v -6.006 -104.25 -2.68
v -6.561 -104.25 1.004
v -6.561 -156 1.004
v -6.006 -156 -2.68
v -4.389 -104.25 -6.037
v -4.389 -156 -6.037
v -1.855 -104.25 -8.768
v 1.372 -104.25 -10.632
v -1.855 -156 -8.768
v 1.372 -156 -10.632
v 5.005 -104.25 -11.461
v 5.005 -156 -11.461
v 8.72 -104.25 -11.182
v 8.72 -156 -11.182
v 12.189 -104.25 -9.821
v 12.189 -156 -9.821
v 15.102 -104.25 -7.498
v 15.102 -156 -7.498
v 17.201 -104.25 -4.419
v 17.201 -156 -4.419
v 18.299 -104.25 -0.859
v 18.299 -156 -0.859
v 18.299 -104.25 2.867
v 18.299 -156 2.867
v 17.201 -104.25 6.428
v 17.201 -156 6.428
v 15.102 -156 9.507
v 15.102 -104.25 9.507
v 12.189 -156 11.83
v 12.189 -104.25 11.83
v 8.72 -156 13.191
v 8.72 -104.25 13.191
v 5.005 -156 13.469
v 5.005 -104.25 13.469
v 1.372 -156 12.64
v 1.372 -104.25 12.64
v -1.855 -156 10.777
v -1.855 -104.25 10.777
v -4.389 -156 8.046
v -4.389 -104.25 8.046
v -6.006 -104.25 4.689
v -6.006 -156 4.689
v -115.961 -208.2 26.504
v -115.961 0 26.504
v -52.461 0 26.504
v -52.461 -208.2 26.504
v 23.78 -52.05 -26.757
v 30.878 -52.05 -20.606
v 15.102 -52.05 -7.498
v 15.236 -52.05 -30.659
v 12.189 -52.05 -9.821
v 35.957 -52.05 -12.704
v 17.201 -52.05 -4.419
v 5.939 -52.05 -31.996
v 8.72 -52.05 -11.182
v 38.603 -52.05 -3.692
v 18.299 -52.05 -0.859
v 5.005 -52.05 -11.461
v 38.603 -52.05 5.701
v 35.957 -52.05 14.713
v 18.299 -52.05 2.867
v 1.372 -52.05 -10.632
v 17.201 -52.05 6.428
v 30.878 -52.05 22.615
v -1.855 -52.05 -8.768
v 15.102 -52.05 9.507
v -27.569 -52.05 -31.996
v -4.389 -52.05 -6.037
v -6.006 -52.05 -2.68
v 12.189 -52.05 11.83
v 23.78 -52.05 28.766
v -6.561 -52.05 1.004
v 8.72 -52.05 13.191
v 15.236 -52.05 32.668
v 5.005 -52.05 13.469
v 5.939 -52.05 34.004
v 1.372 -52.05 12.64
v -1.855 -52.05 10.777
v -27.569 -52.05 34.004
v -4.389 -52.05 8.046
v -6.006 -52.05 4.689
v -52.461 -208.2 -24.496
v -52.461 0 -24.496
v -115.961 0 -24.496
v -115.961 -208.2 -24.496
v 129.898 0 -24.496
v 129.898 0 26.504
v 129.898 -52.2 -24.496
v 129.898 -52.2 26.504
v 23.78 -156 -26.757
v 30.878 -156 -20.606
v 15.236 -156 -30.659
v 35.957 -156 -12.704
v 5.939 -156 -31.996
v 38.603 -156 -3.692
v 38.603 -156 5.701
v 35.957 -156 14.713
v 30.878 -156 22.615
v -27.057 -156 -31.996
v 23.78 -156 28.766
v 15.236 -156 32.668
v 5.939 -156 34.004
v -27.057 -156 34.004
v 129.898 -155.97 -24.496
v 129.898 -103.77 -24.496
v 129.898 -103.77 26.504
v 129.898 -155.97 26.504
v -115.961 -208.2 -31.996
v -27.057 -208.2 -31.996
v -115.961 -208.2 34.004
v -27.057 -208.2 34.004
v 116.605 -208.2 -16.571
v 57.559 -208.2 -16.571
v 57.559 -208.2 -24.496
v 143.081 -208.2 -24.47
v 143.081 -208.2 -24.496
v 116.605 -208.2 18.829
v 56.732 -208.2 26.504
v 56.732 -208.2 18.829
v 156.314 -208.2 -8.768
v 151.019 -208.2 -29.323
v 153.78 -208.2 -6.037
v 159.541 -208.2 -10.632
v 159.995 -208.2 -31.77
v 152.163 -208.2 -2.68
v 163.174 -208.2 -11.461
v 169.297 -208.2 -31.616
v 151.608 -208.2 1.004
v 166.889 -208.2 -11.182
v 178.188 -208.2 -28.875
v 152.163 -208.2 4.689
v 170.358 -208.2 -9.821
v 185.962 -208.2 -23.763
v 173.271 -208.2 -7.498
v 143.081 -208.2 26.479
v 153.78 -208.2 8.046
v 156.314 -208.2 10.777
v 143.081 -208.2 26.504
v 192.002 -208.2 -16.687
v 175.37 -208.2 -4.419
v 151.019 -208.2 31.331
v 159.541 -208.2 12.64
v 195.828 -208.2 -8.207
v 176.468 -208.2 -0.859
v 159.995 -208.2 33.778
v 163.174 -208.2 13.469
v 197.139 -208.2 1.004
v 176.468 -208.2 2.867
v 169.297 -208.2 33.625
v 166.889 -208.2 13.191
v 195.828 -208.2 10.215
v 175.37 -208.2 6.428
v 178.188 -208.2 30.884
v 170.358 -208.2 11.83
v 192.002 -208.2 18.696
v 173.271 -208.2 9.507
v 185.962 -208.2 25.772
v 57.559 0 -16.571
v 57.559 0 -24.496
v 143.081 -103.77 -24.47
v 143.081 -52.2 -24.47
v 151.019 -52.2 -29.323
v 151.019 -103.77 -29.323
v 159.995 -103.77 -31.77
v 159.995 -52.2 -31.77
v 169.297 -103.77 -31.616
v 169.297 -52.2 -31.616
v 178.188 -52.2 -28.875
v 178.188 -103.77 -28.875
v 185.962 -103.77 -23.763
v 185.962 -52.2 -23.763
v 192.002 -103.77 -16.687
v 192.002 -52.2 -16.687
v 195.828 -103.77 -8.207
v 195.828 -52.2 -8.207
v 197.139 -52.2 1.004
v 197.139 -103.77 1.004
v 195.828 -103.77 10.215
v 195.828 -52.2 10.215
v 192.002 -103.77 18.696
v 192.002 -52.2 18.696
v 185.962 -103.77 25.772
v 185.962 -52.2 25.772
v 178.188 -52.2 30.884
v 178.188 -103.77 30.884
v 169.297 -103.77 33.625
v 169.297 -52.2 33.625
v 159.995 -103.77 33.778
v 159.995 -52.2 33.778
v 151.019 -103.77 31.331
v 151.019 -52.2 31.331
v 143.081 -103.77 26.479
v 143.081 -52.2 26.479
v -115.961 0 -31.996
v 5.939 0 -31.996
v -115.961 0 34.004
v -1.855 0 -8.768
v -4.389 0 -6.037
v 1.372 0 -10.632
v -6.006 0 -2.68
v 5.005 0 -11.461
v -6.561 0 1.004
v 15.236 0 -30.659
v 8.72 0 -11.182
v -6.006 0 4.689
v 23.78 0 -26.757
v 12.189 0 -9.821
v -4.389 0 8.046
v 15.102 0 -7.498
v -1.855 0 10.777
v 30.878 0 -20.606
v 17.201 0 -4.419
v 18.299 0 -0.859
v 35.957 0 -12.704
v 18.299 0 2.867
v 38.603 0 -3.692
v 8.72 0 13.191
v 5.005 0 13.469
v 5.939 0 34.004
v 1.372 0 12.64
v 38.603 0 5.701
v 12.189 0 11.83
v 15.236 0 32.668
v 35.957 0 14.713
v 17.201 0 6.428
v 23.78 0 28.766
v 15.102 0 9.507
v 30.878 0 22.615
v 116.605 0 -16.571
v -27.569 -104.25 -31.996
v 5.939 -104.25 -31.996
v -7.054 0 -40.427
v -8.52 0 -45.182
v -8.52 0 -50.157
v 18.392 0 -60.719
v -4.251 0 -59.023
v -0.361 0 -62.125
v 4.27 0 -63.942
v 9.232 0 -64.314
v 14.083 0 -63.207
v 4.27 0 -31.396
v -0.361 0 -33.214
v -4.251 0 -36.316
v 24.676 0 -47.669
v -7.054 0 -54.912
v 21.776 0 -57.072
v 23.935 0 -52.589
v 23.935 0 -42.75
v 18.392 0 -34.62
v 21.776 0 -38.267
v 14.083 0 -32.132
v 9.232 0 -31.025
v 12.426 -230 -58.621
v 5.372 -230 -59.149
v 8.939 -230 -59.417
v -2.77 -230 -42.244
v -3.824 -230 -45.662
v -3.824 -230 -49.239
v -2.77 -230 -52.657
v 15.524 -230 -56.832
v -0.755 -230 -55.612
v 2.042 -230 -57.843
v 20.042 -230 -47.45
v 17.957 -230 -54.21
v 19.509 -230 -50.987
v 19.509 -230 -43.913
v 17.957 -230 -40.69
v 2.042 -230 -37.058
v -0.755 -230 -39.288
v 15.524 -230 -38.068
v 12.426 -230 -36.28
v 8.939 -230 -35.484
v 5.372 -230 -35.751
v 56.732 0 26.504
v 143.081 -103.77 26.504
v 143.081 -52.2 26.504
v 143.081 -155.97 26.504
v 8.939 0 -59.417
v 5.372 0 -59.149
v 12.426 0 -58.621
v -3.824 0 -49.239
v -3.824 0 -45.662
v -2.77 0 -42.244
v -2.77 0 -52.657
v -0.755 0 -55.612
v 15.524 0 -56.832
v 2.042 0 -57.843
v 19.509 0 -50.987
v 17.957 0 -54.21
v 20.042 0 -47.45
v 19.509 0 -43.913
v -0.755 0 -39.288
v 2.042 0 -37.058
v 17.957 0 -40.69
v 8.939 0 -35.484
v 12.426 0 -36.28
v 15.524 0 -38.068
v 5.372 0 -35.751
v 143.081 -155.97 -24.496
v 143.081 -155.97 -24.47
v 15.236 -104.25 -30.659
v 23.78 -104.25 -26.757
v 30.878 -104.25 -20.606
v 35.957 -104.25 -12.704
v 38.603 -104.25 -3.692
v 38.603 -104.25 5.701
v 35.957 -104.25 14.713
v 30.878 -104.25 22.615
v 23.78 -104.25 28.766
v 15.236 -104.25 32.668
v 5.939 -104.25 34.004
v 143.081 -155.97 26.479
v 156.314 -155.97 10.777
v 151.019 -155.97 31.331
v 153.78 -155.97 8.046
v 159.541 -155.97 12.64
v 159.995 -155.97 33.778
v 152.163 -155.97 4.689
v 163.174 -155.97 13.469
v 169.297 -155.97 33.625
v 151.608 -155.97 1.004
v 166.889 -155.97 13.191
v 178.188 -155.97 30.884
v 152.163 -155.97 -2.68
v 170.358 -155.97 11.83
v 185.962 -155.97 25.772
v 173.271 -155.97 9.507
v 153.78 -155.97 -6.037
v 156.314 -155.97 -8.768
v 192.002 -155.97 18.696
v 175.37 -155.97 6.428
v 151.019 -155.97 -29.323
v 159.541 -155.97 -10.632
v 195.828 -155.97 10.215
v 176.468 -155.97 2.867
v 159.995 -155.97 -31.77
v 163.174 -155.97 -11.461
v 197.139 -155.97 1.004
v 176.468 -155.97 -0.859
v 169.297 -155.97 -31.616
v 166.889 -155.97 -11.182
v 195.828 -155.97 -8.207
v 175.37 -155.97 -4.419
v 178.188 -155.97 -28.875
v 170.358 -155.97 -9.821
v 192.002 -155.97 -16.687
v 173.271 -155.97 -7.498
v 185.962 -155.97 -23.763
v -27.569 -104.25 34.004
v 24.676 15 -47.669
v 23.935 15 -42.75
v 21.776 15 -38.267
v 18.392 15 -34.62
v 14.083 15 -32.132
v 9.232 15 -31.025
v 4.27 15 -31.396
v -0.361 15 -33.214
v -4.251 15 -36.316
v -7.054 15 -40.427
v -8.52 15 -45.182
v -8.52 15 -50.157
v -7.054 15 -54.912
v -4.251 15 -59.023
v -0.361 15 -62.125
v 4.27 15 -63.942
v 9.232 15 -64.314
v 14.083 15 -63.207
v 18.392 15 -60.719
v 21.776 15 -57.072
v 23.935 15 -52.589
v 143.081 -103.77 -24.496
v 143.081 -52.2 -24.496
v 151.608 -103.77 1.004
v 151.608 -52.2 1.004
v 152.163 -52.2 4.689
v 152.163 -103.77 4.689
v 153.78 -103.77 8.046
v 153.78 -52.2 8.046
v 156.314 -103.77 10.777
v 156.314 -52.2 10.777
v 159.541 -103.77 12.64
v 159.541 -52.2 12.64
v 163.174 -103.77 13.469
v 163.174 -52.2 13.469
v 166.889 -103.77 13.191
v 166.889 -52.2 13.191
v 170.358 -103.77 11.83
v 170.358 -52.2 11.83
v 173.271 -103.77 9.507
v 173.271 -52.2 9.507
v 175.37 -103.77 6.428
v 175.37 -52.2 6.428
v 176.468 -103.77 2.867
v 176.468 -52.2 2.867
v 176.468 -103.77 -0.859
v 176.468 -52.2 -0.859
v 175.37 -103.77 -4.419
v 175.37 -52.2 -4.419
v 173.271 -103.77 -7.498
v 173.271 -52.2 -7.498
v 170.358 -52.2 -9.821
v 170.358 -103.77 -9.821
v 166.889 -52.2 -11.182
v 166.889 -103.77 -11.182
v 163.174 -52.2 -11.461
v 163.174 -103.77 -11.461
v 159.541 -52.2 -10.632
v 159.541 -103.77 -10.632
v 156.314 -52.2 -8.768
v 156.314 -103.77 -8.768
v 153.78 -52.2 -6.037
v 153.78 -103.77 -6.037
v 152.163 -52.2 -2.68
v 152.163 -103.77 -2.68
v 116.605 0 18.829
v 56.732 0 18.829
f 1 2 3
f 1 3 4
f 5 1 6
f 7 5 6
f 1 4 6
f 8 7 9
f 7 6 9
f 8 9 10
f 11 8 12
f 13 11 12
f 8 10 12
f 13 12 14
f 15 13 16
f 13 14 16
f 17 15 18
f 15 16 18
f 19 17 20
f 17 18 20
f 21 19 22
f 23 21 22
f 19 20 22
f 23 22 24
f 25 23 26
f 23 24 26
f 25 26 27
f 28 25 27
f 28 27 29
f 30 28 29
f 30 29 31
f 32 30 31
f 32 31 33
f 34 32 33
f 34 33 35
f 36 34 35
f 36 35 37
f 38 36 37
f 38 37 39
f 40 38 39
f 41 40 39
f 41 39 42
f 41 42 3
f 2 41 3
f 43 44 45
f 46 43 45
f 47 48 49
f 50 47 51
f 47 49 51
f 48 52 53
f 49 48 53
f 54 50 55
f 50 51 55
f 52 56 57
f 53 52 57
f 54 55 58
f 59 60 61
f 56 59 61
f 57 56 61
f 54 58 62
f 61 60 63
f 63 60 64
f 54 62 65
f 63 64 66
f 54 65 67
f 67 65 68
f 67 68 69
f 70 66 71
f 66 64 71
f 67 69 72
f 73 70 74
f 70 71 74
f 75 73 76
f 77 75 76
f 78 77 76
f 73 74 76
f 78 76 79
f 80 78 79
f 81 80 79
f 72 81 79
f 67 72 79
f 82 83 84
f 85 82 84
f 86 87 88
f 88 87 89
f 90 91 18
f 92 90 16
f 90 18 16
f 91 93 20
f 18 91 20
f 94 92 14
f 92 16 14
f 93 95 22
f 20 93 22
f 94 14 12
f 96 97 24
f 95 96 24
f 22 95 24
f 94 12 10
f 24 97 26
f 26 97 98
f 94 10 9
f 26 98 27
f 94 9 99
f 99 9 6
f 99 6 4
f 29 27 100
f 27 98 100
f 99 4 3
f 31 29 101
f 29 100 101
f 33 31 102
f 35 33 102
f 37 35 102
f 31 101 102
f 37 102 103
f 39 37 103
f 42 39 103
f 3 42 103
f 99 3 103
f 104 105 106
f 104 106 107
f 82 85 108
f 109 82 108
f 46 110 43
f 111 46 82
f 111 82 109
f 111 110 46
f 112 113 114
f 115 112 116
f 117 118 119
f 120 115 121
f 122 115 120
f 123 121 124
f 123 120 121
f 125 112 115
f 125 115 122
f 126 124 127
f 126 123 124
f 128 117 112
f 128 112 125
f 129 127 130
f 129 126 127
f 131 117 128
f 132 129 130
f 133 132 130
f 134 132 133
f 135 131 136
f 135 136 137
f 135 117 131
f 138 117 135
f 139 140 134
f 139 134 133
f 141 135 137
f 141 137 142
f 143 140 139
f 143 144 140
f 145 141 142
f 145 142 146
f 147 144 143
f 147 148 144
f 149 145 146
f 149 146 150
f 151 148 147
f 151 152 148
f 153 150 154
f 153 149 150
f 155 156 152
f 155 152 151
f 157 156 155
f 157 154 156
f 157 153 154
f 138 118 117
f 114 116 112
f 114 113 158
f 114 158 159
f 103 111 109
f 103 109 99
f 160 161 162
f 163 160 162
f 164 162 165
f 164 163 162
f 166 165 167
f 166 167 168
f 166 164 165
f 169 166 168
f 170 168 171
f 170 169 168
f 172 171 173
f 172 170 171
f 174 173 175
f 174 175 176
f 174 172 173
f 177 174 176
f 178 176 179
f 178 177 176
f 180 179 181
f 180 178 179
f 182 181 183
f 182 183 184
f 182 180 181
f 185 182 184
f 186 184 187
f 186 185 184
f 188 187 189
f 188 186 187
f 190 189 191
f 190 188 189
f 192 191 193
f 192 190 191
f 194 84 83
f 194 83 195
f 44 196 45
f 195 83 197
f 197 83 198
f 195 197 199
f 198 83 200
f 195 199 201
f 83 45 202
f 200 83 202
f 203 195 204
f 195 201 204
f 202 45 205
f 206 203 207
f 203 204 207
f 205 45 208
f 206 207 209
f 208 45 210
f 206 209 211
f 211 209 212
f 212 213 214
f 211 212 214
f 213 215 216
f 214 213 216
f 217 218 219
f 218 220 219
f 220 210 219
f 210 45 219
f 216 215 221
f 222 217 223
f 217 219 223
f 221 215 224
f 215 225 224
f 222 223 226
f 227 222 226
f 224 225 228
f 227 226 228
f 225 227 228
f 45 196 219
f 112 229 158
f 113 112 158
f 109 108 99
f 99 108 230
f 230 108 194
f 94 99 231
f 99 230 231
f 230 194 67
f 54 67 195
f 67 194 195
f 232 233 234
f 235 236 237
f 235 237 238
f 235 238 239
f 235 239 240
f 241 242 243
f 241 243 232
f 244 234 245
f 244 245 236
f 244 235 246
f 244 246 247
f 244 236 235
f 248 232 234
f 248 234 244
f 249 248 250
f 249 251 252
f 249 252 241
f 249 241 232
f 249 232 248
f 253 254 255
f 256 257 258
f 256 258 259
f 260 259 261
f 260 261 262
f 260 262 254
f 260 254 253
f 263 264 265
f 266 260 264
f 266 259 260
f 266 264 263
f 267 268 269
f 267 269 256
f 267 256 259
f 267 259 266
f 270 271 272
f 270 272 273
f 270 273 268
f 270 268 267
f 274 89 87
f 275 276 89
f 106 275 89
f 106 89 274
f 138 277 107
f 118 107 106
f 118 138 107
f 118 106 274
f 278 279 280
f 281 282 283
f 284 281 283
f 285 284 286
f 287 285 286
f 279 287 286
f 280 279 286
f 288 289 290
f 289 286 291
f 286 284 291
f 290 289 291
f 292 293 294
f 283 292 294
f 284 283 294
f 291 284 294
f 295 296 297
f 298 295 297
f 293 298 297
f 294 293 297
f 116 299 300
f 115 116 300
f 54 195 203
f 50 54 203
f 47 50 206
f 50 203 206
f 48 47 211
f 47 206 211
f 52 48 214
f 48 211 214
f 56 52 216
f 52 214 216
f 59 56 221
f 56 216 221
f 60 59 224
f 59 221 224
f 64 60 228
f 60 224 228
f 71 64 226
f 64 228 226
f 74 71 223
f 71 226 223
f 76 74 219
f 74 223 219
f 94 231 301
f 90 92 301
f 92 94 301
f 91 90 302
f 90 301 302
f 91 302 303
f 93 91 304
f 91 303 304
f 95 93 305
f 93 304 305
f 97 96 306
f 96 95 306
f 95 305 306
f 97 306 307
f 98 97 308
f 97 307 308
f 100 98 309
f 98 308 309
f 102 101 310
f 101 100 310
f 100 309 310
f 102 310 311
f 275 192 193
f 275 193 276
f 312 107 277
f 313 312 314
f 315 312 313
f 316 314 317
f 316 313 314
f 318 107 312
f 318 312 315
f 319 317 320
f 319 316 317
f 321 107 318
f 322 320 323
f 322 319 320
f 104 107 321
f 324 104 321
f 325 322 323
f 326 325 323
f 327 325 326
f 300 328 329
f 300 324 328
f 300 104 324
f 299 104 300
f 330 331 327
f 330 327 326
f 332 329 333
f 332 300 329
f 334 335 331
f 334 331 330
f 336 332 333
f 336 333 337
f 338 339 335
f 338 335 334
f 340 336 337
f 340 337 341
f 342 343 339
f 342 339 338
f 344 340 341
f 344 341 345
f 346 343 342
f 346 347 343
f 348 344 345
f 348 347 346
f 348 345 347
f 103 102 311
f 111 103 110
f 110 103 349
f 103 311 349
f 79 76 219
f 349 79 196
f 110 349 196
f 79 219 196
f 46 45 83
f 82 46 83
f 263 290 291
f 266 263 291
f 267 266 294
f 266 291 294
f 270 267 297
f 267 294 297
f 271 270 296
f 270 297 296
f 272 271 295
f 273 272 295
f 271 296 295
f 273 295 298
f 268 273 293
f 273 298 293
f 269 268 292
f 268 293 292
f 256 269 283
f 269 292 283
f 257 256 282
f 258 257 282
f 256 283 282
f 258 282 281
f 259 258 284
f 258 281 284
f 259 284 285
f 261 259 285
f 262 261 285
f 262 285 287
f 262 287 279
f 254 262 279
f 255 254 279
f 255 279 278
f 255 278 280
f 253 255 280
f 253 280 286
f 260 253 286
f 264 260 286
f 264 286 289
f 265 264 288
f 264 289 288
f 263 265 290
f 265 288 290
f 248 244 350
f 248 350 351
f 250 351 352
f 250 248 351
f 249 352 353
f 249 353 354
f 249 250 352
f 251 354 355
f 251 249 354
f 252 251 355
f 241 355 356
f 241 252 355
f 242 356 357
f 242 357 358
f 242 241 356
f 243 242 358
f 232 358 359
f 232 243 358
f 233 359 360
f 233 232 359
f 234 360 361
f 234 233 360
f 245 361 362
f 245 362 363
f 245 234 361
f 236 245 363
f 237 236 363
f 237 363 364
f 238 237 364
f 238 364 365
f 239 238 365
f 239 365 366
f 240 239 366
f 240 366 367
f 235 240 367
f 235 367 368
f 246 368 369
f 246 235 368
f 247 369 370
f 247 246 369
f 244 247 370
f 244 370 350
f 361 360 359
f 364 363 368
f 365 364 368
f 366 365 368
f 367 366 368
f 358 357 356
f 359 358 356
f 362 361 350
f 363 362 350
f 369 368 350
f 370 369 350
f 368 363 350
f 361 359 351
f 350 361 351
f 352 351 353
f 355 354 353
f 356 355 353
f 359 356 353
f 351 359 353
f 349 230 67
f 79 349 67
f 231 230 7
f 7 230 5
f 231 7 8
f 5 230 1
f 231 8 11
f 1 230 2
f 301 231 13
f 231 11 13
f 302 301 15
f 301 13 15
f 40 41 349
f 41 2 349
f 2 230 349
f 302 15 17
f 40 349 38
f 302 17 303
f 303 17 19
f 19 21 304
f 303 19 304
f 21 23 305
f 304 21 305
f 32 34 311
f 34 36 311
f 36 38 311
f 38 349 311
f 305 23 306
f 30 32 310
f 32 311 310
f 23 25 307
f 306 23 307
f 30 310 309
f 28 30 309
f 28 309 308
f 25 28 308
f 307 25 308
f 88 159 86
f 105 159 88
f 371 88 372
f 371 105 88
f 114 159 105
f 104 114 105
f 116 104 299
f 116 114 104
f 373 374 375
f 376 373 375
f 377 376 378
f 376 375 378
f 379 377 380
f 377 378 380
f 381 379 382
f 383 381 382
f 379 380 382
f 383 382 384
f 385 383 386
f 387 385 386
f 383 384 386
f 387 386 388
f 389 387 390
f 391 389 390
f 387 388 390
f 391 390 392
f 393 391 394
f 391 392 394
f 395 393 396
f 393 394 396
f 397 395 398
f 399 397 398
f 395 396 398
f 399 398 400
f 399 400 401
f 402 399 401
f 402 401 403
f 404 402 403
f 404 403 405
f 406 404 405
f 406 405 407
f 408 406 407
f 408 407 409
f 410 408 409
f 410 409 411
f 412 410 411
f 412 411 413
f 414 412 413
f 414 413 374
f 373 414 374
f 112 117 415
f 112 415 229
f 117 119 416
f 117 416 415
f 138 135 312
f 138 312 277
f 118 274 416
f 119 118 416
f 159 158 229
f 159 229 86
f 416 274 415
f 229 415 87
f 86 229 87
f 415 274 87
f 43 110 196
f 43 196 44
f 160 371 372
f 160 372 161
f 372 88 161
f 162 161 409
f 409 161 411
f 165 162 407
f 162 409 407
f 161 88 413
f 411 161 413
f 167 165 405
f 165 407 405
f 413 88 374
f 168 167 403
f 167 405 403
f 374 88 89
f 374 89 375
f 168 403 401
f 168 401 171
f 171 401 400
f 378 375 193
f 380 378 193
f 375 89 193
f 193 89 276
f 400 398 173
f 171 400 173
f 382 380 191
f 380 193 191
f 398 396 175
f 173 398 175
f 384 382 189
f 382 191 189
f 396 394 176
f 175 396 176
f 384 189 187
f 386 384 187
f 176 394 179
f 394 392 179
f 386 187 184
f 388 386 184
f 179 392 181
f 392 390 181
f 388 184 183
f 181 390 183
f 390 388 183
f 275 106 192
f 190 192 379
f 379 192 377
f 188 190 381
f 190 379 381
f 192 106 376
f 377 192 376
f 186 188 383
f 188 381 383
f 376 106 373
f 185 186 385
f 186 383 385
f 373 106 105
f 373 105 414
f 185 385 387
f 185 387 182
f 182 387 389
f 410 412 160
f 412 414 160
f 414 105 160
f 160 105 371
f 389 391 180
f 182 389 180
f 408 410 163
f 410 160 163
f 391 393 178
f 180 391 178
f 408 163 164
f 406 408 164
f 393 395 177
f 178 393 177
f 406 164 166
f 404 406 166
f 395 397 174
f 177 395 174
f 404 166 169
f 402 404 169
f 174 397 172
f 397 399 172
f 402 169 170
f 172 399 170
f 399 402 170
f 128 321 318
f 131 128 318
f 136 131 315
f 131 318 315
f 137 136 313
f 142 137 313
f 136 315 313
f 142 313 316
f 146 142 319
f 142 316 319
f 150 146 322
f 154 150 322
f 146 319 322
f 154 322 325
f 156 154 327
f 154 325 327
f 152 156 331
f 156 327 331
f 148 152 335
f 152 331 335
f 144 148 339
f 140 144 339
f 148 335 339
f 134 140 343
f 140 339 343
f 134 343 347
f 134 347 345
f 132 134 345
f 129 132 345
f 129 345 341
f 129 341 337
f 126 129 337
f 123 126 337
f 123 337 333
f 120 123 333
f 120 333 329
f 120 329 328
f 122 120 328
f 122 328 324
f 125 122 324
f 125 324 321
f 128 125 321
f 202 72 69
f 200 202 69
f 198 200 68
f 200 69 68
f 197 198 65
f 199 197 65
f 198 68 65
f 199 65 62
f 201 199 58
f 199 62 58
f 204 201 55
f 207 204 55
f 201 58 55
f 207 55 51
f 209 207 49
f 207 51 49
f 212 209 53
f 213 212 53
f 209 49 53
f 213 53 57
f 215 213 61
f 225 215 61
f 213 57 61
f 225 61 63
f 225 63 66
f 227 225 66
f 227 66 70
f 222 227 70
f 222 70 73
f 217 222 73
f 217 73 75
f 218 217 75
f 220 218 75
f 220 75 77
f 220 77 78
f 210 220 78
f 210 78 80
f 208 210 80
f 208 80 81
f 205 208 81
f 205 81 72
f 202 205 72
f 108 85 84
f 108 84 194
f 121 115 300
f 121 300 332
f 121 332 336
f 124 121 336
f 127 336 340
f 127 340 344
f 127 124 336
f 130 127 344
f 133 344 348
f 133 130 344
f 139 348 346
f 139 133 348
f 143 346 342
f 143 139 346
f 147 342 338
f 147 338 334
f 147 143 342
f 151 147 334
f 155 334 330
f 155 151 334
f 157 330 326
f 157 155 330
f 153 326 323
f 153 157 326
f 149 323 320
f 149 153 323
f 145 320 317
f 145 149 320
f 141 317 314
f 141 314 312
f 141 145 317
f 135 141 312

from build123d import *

# Parameters (mm, degrees)
F1_DEPTH  = 208.2
F3_D      = 25
F7_DEPTH  = 208.2
F9_D      = 25
F10_W     = 33.5077310764
F10_H     = 52.2
F10_W_2   = 41.4922689236
F10_W_3   = 42.0042114099
F10_W_4   = 32.9957885901
F10_W_5   = 75
F11_DEPTH = 66.0320122191
F12_W     = 75
F12_H     = 52.2
F13_DEPTH = 75
F14_R     = 12
F15_DEPTH = 230
F16_R     = 16.6914911111
F17_DEPTH = 15


with BuildPart() as f1:
    # F0 (on Front) → F1 (new body)
    with BuildSketch(Plane.XZ):
        with BuildLine():
            Line((5.9386579103, 34.0044003353), (-115.9613420897, 34.0044003353))
            Line((-115.9613420897, 34.0044003353), (-115.9613420897, 26.5044003353))
            Line((-115.9613420897, 26.5044003353), (-52.4613420897, 26.5044003353))
            Line((-52.4613420897, 26.5044003353), (-52.4613420897, -24.4955996647))
            Line((-52.4613420897, -24.4955996647), (-115.9613420897, -24.4955996647))
            Line((-115.9613420897, -24.4955996647), (-115.9613420897, -31.9955996647))
            Line((-115.9613420897, -31.9955996647), (5.9386579103, -31.9955996647))
            ThreePointArc((5.9386579103, -31.9955996647), (38.9386579103, 1.0044003353), (5.9386579103, 34.0044003353))
        make_face()
    extrude(amount=F1_DEPTH)

    # F3 (through all)
    with Locations(Plane(origin=(0, 0, 0), x_dir=(1, 0, 0), z_dir=(0, 1, 0))):
        with Locations((5.9386579103, -1.0044003353)):
            Hole(F3_D / 2)


with BuildPart() as f4_1:
    # F4: copy of F1
    add(f1.part.moved(Location((158.2, 0, 0))))


with BuildPart() as f7:
    # F5 (on face) → F7 (new body)
    with BuildSketch(Plane.XZ.offset(208.2)):
        with BuildLine():
            Line((143.0810586394, 26.5044003353), (56.7319393158, 26.5044003353))
            Line((56.7319393158, 26.5044003353), (56.7319393158, 18.8286447808))
            Line((56.7319393158, 18.8286447808), (116.6046112776, 18.8286447808))
            Line((116.6046112776, 18.8286447808), (116.6046112776, -16.5713552192))
            Line((116.6046112776, -16.5713552192), (57.5585439801, -16.5713552192))
            Line((57.5585439801, -16.5713552192), (57.5585439801, -24.4955996647))
            Line((57.5585439801, -24.4955996647), (143.0810586394, -24.4955996647))
            Line((143.0810586394, -24.4955996647), (143.0810586394, -24.4697121158))
            ThreePointArc((143.0810586394, -24.4697121158), (197.1386579103, 1.0044003353), (143.0810586394, 26.4785127863))
            Line((143.0810586394, 26.4785127863), (143.0810586394, 26.5044003353))
        make_face()
    extrude(amount=-F7_DEPTH)

    # F9 (through all)
    with Locations(Plane.XZ.offset(208.2)):
        with Locations((164.1076456912, 1.0044003353)):
            Hole(F9_D / 2)

    # F12 (on face) → F13 (cut, symmetric)
    with BuildSketch(Plane(origin=(0, 0, -24.4955996647), x_dir=(1, 0, 0), z_dir=(0, 0, -1))):
        with Locations((167.3975795507, 26.1)):
            Rectangle(F12_W, F12_H)
        with Locations((167.3975776881, 129.8699952722)):
            Rectangle(F12_W, F12_H)
    extrude(amount=F13_DEPTH, both=True, mode=Mode.SUBTRACT)


with BuildPart() as f1_1:
    add(f1.part)

    # F10 (on face) → F11 (cut, through all)
    with BuildSketch(Plane.XY.offset(34.0044003353)):
        with Locations((-10.8152076279, -78.15)):
            Rectangle(F10_W, F10_H)
        with Locations((26.6847923721, -78.15)):
            Rectangle(F10_W_2, F10_H)
        with Locations((26.9407636153, -182.1)):
            Rectangle(F10_W_3, F10_H)
        with Locations((-10.5592363847, -182.1)):
            Rectangle(F10_W_4, F10_H)
        with Locations((167.2925822881, -182.1)):
            Rectangle(F10_W_5, F10_H)
    extrude(amount=-F11_DEPTH, mode=Mode.SUBTRACT)


with BuildPart() as f15:
    # F14 (on Front) → F15 (new body)
    with BuildSketch(Plane.XZ):
        with Locations((8.0419126898, -47.4503040314)):
            Circle(F14_R)
    extrude(amount=F15_DEPTH)


with BuildPart() as f17:
    # F16 (on Front) → F17 (new body)
    with BuildSketch(Plane.XZ):
        with Locations((7.9846158624, -47.6694740355)):
            Circle(F16_R)
    extrude(amount=-F17_DEPTH)


solid = Compound([f7.part, f1_1.part, f15.part, f17.part])
